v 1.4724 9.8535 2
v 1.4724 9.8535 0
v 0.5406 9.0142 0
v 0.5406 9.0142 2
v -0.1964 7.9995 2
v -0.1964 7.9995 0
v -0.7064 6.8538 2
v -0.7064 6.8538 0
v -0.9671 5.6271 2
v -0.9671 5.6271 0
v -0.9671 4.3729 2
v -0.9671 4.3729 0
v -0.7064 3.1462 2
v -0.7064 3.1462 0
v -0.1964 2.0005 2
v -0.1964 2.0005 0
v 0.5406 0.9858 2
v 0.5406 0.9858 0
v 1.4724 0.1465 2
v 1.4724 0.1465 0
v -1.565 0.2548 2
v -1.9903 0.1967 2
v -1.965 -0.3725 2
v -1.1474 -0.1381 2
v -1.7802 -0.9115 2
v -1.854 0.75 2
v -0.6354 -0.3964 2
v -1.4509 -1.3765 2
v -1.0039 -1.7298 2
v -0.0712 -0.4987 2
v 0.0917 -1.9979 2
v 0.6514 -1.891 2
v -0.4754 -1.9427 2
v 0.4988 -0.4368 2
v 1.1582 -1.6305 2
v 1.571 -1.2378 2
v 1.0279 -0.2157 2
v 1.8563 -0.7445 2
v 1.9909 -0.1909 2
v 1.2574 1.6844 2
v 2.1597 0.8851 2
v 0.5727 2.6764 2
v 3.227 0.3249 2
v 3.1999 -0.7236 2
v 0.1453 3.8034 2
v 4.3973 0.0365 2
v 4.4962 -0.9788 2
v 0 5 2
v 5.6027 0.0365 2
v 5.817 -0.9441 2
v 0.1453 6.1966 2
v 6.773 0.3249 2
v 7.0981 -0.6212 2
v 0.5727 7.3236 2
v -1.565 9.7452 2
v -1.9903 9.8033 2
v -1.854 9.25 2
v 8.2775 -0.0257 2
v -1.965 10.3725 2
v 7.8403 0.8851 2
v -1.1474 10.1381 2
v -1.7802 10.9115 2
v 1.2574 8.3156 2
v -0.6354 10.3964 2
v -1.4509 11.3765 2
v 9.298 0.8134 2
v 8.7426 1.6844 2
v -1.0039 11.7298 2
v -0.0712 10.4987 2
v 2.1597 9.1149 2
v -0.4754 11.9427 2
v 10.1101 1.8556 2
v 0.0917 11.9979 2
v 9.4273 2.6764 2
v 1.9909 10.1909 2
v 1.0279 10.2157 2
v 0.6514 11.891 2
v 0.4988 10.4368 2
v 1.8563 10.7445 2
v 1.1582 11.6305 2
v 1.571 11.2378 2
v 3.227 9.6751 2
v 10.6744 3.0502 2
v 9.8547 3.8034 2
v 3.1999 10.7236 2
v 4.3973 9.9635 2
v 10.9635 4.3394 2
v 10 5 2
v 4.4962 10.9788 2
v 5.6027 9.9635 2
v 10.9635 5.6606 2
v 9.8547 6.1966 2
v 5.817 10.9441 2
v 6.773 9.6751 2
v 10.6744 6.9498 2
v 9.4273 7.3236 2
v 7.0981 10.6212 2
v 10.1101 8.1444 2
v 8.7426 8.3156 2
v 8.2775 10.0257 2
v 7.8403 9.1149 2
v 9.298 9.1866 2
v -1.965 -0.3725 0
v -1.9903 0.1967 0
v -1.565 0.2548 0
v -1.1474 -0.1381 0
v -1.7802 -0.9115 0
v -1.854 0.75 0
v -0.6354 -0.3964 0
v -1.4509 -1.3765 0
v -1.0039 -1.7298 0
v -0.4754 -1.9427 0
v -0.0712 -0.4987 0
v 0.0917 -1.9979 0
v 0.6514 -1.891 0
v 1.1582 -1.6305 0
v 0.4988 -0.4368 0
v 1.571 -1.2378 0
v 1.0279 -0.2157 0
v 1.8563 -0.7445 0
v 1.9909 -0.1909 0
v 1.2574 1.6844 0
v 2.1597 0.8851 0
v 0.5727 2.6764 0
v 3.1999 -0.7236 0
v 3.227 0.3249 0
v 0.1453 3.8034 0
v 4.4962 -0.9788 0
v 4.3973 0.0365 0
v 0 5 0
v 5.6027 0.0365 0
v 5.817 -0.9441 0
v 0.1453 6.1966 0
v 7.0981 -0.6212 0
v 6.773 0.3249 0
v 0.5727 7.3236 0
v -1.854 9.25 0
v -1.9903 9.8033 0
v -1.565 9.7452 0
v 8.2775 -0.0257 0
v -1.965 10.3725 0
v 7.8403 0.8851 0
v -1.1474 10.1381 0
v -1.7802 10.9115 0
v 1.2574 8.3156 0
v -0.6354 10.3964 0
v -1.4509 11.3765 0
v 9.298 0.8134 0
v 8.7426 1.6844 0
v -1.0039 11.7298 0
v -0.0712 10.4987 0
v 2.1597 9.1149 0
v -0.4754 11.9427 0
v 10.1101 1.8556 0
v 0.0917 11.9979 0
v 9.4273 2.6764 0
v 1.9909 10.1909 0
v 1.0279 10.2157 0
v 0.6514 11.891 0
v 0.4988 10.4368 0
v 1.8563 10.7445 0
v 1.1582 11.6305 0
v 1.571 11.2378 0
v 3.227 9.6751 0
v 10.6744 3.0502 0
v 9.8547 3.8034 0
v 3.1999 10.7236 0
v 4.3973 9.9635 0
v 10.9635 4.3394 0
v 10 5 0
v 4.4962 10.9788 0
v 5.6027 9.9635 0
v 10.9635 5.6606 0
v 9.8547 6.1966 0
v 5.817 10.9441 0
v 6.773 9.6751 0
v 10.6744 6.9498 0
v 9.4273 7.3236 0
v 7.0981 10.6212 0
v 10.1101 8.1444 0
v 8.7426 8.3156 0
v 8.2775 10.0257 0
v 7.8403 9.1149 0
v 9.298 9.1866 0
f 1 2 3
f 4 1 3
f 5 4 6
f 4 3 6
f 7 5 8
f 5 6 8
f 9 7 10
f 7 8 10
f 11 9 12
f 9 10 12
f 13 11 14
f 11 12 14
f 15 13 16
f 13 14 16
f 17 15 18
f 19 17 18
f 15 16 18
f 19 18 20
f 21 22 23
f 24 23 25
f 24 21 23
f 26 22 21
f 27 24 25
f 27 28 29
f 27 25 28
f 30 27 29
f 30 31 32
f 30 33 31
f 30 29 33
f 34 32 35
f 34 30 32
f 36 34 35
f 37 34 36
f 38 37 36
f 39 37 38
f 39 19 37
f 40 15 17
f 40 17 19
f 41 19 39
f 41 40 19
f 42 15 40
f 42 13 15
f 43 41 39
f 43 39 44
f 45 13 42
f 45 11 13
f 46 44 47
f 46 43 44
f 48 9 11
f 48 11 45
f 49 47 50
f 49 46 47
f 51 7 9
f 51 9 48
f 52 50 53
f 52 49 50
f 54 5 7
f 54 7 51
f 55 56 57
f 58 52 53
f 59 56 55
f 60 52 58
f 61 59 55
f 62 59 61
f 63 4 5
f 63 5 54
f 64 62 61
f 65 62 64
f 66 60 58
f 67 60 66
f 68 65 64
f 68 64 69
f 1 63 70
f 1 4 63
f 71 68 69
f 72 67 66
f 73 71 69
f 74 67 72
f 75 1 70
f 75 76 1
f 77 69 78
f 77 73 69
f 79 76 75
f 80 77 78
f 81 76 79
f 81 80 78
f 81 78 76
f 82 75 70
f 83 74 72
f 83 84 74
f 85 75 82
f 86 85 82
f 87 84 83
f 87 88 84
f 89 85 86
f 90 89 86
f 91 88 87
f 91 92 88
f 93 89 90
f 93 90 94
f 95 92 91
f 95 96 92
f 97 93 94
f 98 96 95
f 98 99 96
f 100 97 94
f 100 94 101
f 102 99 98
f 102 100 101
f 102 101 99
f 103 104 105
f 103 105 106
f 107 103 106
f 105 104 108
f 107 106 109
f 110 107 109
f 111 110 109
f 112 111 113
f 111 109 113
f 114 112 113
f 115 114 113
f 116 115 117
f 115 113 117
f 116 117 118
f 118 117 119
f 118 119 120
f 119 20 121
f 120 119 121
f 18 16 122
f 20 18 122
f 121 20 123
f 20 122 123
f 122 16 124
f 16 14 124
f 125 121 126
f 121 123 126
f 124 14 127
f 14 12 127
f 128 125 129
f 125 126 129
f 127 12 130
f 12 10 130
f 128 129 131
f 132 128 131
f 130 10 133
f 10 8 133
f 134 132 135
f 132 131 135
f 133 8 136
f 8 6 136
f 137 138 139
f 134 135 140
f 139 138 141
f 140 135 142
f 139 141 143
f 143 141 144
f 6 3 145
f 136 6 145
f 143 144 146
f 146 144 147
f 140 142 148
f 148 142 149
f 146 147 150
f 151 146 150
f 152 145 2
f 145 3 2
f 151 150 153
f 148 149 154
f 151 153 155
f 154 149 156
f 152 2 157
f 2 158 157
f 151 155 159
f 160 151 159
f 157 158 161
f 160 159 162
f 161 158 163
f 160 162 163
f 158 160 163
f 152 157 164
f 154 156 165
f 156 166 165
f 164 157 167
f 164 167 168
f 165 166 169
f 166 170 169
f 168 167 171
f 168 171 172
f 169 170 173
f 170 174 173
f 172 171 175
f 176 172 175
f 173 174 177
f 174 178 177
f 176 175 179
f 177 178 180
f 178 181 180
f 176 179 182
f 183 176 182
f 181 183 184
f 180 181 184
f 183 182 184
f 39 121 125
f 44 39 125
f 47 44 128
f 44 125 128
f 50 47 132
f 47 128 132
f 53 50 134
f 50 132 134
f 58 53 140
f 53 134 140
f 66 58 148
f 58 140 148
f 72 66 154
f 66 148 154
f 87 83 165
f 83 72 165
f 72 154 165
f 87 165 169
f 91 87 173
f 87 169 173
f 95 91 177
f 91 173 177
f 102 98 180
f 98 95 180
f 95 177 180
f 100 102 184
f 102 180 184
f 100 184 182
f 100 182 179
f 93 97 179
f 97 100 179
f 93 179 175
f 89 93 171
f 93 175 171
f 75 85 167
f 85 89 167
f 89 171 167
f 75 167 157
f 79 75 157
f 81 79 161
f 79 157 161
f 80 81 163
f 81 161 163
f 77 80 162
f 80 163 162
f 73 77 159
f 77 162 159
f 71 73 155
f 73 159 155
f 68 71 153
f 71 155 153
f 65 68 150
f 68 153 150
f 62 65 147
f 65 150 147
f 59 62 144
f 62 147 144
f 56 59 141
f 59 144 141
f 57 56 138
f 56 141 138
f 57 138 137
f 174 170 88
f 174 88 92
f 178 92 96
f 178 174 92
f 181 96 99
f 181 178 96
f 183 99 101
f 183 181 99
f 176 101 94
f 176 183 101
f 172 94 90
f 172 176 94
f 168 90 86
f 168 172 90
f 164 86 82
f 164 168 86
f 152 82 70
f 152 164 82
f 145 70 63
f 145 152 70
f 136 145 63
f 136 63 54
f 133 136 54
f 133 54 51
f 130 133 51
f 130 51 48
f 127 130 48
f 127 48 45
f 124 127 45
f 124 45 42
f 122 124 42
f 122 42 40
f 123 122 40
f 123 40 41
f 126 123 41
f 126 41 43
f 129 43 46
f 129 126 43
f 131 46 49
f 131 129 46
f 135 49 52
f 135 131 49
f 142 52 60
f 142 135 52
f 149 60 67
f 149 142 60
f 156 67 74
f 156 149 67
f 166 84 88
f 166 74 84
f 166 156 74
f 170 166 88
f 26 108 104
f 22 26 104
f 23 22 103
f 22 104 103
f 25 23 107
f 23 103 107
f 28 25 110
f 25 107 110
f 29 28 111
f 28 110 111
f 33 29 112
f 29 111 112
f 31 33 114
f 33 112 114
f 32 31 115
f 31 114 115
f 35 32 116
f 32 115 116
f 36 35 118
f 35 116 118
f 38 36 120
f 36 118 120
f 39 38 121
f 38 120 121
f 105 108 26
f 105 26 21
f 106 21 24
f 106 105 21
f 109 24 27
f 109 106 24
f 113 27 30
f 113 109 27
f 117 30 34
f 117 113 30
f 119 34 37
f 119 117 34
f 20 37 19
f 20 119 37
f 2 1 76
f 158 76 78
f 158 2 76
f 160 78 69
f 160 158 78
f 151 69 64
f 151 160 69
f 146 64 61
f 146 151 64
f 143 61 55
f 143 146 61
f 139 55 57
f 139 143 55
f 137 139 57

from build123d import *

# Parameters (mm, degrees)
CYLINDER005_R          = 5
CYLINDER005_DEPTH      = 3
CYLINDER003_R          = 2
CYLINDER003_DEPTH      = 4
CYLINDER002_R          = 2
CYLINDER002_DEPTH      = 2
CUT001_PLACEMENT_ANGLE = 180
CYLINDER001_R          = 2
CYLINDER001_DEPTH      = 4
CYLINDER_R             = 2
CYLINDER_DEPTH         = 2
CYLINDER004_R          = 6
CYLINDER004_DEPTH      = 2


with BuildPart() as cylinder005:
    # Cylinder005 → Cylinder005 (new body)
    with BuildSketch(Plane(origin=(5, 5, 0), x_dir=(1, 0, 0), z_dir=(0, 0, 1))):
        Circle(CYLINDER005_R)
    extrude(amount=CYLINDER005_DEPTH)


with BuildPart() as cylinder003:
    # Cylinder003 → Cylinder003 (new body)
    with BuildSketch(Plane(origin=(0, 1.5, 0), x_dir=(1, 0, 0), z_dir=(0, 0, 1))):
        Circle(CYLINDER003_R)
    extrude(amount=CYLINDER003_DEPTH)


with BuildPart() as cut001:
    # Cylinder002 → Cylinder002 (new body)
    with BuildSketch(Plane.XY):
        Circle(CYLINDER002_R)
    extrude(amount=CYLINDER002_DEPTH)

    # Cut001: cut Cylinder003
    add(cylinder003.part, mode=Mode.SUBTRACT)


with BuildPart() as cut001_1:
    # Cut001 placement: moved
    add(cut001.part.moved(Location((0, 10, 0))).rotate(Axis((0, 10, 0), (0, 0, 1)), CUT001_PLACEMENT_ANGLE))


with BuildPart() as cylinder001:
    # Cylinder001 → Cylinder001 (new body)
    with BuildSketch(Plane(origin=(0, 1.5, 0), x_dir=(1, 0, 0), z_dir=(0, 0, 1))):
        Circle(CYLINDER001_R)
    extrude(amount=CYLINDER001_DEPTH)


with BuildPart() as cut:
    # Cylinder → Cylinder (new body)
    with BuildSketch(Plane.XY):
        Circle(CYLINDER_R)
    extrude(amount=CYLINDER_DEPTH)

    # Cut: cut Cylinder001
    add(cylinder001.part, mode=Mode.SUBTRACT)


with BuildPart() as cut002:
    # Cylinder004 → Cylinder004 (new body)
    with BuildSketch(Plane(origin=(5, 5, 0), x_dir=(1, 0, 0), z_dir=(0, 0, 1))):
        Circle(CYLINDER004_R)
    extrude(amount=CYLINDER004_DEPTH)

    # Fusion: union Cut001, Cut
    add(cut001_1.part)
    add(cut.part)

    # Cut002: cut Cylinder005
    add(cylinder005.part, mode=Mode.SUBTRACT)


solid = cut002.part
